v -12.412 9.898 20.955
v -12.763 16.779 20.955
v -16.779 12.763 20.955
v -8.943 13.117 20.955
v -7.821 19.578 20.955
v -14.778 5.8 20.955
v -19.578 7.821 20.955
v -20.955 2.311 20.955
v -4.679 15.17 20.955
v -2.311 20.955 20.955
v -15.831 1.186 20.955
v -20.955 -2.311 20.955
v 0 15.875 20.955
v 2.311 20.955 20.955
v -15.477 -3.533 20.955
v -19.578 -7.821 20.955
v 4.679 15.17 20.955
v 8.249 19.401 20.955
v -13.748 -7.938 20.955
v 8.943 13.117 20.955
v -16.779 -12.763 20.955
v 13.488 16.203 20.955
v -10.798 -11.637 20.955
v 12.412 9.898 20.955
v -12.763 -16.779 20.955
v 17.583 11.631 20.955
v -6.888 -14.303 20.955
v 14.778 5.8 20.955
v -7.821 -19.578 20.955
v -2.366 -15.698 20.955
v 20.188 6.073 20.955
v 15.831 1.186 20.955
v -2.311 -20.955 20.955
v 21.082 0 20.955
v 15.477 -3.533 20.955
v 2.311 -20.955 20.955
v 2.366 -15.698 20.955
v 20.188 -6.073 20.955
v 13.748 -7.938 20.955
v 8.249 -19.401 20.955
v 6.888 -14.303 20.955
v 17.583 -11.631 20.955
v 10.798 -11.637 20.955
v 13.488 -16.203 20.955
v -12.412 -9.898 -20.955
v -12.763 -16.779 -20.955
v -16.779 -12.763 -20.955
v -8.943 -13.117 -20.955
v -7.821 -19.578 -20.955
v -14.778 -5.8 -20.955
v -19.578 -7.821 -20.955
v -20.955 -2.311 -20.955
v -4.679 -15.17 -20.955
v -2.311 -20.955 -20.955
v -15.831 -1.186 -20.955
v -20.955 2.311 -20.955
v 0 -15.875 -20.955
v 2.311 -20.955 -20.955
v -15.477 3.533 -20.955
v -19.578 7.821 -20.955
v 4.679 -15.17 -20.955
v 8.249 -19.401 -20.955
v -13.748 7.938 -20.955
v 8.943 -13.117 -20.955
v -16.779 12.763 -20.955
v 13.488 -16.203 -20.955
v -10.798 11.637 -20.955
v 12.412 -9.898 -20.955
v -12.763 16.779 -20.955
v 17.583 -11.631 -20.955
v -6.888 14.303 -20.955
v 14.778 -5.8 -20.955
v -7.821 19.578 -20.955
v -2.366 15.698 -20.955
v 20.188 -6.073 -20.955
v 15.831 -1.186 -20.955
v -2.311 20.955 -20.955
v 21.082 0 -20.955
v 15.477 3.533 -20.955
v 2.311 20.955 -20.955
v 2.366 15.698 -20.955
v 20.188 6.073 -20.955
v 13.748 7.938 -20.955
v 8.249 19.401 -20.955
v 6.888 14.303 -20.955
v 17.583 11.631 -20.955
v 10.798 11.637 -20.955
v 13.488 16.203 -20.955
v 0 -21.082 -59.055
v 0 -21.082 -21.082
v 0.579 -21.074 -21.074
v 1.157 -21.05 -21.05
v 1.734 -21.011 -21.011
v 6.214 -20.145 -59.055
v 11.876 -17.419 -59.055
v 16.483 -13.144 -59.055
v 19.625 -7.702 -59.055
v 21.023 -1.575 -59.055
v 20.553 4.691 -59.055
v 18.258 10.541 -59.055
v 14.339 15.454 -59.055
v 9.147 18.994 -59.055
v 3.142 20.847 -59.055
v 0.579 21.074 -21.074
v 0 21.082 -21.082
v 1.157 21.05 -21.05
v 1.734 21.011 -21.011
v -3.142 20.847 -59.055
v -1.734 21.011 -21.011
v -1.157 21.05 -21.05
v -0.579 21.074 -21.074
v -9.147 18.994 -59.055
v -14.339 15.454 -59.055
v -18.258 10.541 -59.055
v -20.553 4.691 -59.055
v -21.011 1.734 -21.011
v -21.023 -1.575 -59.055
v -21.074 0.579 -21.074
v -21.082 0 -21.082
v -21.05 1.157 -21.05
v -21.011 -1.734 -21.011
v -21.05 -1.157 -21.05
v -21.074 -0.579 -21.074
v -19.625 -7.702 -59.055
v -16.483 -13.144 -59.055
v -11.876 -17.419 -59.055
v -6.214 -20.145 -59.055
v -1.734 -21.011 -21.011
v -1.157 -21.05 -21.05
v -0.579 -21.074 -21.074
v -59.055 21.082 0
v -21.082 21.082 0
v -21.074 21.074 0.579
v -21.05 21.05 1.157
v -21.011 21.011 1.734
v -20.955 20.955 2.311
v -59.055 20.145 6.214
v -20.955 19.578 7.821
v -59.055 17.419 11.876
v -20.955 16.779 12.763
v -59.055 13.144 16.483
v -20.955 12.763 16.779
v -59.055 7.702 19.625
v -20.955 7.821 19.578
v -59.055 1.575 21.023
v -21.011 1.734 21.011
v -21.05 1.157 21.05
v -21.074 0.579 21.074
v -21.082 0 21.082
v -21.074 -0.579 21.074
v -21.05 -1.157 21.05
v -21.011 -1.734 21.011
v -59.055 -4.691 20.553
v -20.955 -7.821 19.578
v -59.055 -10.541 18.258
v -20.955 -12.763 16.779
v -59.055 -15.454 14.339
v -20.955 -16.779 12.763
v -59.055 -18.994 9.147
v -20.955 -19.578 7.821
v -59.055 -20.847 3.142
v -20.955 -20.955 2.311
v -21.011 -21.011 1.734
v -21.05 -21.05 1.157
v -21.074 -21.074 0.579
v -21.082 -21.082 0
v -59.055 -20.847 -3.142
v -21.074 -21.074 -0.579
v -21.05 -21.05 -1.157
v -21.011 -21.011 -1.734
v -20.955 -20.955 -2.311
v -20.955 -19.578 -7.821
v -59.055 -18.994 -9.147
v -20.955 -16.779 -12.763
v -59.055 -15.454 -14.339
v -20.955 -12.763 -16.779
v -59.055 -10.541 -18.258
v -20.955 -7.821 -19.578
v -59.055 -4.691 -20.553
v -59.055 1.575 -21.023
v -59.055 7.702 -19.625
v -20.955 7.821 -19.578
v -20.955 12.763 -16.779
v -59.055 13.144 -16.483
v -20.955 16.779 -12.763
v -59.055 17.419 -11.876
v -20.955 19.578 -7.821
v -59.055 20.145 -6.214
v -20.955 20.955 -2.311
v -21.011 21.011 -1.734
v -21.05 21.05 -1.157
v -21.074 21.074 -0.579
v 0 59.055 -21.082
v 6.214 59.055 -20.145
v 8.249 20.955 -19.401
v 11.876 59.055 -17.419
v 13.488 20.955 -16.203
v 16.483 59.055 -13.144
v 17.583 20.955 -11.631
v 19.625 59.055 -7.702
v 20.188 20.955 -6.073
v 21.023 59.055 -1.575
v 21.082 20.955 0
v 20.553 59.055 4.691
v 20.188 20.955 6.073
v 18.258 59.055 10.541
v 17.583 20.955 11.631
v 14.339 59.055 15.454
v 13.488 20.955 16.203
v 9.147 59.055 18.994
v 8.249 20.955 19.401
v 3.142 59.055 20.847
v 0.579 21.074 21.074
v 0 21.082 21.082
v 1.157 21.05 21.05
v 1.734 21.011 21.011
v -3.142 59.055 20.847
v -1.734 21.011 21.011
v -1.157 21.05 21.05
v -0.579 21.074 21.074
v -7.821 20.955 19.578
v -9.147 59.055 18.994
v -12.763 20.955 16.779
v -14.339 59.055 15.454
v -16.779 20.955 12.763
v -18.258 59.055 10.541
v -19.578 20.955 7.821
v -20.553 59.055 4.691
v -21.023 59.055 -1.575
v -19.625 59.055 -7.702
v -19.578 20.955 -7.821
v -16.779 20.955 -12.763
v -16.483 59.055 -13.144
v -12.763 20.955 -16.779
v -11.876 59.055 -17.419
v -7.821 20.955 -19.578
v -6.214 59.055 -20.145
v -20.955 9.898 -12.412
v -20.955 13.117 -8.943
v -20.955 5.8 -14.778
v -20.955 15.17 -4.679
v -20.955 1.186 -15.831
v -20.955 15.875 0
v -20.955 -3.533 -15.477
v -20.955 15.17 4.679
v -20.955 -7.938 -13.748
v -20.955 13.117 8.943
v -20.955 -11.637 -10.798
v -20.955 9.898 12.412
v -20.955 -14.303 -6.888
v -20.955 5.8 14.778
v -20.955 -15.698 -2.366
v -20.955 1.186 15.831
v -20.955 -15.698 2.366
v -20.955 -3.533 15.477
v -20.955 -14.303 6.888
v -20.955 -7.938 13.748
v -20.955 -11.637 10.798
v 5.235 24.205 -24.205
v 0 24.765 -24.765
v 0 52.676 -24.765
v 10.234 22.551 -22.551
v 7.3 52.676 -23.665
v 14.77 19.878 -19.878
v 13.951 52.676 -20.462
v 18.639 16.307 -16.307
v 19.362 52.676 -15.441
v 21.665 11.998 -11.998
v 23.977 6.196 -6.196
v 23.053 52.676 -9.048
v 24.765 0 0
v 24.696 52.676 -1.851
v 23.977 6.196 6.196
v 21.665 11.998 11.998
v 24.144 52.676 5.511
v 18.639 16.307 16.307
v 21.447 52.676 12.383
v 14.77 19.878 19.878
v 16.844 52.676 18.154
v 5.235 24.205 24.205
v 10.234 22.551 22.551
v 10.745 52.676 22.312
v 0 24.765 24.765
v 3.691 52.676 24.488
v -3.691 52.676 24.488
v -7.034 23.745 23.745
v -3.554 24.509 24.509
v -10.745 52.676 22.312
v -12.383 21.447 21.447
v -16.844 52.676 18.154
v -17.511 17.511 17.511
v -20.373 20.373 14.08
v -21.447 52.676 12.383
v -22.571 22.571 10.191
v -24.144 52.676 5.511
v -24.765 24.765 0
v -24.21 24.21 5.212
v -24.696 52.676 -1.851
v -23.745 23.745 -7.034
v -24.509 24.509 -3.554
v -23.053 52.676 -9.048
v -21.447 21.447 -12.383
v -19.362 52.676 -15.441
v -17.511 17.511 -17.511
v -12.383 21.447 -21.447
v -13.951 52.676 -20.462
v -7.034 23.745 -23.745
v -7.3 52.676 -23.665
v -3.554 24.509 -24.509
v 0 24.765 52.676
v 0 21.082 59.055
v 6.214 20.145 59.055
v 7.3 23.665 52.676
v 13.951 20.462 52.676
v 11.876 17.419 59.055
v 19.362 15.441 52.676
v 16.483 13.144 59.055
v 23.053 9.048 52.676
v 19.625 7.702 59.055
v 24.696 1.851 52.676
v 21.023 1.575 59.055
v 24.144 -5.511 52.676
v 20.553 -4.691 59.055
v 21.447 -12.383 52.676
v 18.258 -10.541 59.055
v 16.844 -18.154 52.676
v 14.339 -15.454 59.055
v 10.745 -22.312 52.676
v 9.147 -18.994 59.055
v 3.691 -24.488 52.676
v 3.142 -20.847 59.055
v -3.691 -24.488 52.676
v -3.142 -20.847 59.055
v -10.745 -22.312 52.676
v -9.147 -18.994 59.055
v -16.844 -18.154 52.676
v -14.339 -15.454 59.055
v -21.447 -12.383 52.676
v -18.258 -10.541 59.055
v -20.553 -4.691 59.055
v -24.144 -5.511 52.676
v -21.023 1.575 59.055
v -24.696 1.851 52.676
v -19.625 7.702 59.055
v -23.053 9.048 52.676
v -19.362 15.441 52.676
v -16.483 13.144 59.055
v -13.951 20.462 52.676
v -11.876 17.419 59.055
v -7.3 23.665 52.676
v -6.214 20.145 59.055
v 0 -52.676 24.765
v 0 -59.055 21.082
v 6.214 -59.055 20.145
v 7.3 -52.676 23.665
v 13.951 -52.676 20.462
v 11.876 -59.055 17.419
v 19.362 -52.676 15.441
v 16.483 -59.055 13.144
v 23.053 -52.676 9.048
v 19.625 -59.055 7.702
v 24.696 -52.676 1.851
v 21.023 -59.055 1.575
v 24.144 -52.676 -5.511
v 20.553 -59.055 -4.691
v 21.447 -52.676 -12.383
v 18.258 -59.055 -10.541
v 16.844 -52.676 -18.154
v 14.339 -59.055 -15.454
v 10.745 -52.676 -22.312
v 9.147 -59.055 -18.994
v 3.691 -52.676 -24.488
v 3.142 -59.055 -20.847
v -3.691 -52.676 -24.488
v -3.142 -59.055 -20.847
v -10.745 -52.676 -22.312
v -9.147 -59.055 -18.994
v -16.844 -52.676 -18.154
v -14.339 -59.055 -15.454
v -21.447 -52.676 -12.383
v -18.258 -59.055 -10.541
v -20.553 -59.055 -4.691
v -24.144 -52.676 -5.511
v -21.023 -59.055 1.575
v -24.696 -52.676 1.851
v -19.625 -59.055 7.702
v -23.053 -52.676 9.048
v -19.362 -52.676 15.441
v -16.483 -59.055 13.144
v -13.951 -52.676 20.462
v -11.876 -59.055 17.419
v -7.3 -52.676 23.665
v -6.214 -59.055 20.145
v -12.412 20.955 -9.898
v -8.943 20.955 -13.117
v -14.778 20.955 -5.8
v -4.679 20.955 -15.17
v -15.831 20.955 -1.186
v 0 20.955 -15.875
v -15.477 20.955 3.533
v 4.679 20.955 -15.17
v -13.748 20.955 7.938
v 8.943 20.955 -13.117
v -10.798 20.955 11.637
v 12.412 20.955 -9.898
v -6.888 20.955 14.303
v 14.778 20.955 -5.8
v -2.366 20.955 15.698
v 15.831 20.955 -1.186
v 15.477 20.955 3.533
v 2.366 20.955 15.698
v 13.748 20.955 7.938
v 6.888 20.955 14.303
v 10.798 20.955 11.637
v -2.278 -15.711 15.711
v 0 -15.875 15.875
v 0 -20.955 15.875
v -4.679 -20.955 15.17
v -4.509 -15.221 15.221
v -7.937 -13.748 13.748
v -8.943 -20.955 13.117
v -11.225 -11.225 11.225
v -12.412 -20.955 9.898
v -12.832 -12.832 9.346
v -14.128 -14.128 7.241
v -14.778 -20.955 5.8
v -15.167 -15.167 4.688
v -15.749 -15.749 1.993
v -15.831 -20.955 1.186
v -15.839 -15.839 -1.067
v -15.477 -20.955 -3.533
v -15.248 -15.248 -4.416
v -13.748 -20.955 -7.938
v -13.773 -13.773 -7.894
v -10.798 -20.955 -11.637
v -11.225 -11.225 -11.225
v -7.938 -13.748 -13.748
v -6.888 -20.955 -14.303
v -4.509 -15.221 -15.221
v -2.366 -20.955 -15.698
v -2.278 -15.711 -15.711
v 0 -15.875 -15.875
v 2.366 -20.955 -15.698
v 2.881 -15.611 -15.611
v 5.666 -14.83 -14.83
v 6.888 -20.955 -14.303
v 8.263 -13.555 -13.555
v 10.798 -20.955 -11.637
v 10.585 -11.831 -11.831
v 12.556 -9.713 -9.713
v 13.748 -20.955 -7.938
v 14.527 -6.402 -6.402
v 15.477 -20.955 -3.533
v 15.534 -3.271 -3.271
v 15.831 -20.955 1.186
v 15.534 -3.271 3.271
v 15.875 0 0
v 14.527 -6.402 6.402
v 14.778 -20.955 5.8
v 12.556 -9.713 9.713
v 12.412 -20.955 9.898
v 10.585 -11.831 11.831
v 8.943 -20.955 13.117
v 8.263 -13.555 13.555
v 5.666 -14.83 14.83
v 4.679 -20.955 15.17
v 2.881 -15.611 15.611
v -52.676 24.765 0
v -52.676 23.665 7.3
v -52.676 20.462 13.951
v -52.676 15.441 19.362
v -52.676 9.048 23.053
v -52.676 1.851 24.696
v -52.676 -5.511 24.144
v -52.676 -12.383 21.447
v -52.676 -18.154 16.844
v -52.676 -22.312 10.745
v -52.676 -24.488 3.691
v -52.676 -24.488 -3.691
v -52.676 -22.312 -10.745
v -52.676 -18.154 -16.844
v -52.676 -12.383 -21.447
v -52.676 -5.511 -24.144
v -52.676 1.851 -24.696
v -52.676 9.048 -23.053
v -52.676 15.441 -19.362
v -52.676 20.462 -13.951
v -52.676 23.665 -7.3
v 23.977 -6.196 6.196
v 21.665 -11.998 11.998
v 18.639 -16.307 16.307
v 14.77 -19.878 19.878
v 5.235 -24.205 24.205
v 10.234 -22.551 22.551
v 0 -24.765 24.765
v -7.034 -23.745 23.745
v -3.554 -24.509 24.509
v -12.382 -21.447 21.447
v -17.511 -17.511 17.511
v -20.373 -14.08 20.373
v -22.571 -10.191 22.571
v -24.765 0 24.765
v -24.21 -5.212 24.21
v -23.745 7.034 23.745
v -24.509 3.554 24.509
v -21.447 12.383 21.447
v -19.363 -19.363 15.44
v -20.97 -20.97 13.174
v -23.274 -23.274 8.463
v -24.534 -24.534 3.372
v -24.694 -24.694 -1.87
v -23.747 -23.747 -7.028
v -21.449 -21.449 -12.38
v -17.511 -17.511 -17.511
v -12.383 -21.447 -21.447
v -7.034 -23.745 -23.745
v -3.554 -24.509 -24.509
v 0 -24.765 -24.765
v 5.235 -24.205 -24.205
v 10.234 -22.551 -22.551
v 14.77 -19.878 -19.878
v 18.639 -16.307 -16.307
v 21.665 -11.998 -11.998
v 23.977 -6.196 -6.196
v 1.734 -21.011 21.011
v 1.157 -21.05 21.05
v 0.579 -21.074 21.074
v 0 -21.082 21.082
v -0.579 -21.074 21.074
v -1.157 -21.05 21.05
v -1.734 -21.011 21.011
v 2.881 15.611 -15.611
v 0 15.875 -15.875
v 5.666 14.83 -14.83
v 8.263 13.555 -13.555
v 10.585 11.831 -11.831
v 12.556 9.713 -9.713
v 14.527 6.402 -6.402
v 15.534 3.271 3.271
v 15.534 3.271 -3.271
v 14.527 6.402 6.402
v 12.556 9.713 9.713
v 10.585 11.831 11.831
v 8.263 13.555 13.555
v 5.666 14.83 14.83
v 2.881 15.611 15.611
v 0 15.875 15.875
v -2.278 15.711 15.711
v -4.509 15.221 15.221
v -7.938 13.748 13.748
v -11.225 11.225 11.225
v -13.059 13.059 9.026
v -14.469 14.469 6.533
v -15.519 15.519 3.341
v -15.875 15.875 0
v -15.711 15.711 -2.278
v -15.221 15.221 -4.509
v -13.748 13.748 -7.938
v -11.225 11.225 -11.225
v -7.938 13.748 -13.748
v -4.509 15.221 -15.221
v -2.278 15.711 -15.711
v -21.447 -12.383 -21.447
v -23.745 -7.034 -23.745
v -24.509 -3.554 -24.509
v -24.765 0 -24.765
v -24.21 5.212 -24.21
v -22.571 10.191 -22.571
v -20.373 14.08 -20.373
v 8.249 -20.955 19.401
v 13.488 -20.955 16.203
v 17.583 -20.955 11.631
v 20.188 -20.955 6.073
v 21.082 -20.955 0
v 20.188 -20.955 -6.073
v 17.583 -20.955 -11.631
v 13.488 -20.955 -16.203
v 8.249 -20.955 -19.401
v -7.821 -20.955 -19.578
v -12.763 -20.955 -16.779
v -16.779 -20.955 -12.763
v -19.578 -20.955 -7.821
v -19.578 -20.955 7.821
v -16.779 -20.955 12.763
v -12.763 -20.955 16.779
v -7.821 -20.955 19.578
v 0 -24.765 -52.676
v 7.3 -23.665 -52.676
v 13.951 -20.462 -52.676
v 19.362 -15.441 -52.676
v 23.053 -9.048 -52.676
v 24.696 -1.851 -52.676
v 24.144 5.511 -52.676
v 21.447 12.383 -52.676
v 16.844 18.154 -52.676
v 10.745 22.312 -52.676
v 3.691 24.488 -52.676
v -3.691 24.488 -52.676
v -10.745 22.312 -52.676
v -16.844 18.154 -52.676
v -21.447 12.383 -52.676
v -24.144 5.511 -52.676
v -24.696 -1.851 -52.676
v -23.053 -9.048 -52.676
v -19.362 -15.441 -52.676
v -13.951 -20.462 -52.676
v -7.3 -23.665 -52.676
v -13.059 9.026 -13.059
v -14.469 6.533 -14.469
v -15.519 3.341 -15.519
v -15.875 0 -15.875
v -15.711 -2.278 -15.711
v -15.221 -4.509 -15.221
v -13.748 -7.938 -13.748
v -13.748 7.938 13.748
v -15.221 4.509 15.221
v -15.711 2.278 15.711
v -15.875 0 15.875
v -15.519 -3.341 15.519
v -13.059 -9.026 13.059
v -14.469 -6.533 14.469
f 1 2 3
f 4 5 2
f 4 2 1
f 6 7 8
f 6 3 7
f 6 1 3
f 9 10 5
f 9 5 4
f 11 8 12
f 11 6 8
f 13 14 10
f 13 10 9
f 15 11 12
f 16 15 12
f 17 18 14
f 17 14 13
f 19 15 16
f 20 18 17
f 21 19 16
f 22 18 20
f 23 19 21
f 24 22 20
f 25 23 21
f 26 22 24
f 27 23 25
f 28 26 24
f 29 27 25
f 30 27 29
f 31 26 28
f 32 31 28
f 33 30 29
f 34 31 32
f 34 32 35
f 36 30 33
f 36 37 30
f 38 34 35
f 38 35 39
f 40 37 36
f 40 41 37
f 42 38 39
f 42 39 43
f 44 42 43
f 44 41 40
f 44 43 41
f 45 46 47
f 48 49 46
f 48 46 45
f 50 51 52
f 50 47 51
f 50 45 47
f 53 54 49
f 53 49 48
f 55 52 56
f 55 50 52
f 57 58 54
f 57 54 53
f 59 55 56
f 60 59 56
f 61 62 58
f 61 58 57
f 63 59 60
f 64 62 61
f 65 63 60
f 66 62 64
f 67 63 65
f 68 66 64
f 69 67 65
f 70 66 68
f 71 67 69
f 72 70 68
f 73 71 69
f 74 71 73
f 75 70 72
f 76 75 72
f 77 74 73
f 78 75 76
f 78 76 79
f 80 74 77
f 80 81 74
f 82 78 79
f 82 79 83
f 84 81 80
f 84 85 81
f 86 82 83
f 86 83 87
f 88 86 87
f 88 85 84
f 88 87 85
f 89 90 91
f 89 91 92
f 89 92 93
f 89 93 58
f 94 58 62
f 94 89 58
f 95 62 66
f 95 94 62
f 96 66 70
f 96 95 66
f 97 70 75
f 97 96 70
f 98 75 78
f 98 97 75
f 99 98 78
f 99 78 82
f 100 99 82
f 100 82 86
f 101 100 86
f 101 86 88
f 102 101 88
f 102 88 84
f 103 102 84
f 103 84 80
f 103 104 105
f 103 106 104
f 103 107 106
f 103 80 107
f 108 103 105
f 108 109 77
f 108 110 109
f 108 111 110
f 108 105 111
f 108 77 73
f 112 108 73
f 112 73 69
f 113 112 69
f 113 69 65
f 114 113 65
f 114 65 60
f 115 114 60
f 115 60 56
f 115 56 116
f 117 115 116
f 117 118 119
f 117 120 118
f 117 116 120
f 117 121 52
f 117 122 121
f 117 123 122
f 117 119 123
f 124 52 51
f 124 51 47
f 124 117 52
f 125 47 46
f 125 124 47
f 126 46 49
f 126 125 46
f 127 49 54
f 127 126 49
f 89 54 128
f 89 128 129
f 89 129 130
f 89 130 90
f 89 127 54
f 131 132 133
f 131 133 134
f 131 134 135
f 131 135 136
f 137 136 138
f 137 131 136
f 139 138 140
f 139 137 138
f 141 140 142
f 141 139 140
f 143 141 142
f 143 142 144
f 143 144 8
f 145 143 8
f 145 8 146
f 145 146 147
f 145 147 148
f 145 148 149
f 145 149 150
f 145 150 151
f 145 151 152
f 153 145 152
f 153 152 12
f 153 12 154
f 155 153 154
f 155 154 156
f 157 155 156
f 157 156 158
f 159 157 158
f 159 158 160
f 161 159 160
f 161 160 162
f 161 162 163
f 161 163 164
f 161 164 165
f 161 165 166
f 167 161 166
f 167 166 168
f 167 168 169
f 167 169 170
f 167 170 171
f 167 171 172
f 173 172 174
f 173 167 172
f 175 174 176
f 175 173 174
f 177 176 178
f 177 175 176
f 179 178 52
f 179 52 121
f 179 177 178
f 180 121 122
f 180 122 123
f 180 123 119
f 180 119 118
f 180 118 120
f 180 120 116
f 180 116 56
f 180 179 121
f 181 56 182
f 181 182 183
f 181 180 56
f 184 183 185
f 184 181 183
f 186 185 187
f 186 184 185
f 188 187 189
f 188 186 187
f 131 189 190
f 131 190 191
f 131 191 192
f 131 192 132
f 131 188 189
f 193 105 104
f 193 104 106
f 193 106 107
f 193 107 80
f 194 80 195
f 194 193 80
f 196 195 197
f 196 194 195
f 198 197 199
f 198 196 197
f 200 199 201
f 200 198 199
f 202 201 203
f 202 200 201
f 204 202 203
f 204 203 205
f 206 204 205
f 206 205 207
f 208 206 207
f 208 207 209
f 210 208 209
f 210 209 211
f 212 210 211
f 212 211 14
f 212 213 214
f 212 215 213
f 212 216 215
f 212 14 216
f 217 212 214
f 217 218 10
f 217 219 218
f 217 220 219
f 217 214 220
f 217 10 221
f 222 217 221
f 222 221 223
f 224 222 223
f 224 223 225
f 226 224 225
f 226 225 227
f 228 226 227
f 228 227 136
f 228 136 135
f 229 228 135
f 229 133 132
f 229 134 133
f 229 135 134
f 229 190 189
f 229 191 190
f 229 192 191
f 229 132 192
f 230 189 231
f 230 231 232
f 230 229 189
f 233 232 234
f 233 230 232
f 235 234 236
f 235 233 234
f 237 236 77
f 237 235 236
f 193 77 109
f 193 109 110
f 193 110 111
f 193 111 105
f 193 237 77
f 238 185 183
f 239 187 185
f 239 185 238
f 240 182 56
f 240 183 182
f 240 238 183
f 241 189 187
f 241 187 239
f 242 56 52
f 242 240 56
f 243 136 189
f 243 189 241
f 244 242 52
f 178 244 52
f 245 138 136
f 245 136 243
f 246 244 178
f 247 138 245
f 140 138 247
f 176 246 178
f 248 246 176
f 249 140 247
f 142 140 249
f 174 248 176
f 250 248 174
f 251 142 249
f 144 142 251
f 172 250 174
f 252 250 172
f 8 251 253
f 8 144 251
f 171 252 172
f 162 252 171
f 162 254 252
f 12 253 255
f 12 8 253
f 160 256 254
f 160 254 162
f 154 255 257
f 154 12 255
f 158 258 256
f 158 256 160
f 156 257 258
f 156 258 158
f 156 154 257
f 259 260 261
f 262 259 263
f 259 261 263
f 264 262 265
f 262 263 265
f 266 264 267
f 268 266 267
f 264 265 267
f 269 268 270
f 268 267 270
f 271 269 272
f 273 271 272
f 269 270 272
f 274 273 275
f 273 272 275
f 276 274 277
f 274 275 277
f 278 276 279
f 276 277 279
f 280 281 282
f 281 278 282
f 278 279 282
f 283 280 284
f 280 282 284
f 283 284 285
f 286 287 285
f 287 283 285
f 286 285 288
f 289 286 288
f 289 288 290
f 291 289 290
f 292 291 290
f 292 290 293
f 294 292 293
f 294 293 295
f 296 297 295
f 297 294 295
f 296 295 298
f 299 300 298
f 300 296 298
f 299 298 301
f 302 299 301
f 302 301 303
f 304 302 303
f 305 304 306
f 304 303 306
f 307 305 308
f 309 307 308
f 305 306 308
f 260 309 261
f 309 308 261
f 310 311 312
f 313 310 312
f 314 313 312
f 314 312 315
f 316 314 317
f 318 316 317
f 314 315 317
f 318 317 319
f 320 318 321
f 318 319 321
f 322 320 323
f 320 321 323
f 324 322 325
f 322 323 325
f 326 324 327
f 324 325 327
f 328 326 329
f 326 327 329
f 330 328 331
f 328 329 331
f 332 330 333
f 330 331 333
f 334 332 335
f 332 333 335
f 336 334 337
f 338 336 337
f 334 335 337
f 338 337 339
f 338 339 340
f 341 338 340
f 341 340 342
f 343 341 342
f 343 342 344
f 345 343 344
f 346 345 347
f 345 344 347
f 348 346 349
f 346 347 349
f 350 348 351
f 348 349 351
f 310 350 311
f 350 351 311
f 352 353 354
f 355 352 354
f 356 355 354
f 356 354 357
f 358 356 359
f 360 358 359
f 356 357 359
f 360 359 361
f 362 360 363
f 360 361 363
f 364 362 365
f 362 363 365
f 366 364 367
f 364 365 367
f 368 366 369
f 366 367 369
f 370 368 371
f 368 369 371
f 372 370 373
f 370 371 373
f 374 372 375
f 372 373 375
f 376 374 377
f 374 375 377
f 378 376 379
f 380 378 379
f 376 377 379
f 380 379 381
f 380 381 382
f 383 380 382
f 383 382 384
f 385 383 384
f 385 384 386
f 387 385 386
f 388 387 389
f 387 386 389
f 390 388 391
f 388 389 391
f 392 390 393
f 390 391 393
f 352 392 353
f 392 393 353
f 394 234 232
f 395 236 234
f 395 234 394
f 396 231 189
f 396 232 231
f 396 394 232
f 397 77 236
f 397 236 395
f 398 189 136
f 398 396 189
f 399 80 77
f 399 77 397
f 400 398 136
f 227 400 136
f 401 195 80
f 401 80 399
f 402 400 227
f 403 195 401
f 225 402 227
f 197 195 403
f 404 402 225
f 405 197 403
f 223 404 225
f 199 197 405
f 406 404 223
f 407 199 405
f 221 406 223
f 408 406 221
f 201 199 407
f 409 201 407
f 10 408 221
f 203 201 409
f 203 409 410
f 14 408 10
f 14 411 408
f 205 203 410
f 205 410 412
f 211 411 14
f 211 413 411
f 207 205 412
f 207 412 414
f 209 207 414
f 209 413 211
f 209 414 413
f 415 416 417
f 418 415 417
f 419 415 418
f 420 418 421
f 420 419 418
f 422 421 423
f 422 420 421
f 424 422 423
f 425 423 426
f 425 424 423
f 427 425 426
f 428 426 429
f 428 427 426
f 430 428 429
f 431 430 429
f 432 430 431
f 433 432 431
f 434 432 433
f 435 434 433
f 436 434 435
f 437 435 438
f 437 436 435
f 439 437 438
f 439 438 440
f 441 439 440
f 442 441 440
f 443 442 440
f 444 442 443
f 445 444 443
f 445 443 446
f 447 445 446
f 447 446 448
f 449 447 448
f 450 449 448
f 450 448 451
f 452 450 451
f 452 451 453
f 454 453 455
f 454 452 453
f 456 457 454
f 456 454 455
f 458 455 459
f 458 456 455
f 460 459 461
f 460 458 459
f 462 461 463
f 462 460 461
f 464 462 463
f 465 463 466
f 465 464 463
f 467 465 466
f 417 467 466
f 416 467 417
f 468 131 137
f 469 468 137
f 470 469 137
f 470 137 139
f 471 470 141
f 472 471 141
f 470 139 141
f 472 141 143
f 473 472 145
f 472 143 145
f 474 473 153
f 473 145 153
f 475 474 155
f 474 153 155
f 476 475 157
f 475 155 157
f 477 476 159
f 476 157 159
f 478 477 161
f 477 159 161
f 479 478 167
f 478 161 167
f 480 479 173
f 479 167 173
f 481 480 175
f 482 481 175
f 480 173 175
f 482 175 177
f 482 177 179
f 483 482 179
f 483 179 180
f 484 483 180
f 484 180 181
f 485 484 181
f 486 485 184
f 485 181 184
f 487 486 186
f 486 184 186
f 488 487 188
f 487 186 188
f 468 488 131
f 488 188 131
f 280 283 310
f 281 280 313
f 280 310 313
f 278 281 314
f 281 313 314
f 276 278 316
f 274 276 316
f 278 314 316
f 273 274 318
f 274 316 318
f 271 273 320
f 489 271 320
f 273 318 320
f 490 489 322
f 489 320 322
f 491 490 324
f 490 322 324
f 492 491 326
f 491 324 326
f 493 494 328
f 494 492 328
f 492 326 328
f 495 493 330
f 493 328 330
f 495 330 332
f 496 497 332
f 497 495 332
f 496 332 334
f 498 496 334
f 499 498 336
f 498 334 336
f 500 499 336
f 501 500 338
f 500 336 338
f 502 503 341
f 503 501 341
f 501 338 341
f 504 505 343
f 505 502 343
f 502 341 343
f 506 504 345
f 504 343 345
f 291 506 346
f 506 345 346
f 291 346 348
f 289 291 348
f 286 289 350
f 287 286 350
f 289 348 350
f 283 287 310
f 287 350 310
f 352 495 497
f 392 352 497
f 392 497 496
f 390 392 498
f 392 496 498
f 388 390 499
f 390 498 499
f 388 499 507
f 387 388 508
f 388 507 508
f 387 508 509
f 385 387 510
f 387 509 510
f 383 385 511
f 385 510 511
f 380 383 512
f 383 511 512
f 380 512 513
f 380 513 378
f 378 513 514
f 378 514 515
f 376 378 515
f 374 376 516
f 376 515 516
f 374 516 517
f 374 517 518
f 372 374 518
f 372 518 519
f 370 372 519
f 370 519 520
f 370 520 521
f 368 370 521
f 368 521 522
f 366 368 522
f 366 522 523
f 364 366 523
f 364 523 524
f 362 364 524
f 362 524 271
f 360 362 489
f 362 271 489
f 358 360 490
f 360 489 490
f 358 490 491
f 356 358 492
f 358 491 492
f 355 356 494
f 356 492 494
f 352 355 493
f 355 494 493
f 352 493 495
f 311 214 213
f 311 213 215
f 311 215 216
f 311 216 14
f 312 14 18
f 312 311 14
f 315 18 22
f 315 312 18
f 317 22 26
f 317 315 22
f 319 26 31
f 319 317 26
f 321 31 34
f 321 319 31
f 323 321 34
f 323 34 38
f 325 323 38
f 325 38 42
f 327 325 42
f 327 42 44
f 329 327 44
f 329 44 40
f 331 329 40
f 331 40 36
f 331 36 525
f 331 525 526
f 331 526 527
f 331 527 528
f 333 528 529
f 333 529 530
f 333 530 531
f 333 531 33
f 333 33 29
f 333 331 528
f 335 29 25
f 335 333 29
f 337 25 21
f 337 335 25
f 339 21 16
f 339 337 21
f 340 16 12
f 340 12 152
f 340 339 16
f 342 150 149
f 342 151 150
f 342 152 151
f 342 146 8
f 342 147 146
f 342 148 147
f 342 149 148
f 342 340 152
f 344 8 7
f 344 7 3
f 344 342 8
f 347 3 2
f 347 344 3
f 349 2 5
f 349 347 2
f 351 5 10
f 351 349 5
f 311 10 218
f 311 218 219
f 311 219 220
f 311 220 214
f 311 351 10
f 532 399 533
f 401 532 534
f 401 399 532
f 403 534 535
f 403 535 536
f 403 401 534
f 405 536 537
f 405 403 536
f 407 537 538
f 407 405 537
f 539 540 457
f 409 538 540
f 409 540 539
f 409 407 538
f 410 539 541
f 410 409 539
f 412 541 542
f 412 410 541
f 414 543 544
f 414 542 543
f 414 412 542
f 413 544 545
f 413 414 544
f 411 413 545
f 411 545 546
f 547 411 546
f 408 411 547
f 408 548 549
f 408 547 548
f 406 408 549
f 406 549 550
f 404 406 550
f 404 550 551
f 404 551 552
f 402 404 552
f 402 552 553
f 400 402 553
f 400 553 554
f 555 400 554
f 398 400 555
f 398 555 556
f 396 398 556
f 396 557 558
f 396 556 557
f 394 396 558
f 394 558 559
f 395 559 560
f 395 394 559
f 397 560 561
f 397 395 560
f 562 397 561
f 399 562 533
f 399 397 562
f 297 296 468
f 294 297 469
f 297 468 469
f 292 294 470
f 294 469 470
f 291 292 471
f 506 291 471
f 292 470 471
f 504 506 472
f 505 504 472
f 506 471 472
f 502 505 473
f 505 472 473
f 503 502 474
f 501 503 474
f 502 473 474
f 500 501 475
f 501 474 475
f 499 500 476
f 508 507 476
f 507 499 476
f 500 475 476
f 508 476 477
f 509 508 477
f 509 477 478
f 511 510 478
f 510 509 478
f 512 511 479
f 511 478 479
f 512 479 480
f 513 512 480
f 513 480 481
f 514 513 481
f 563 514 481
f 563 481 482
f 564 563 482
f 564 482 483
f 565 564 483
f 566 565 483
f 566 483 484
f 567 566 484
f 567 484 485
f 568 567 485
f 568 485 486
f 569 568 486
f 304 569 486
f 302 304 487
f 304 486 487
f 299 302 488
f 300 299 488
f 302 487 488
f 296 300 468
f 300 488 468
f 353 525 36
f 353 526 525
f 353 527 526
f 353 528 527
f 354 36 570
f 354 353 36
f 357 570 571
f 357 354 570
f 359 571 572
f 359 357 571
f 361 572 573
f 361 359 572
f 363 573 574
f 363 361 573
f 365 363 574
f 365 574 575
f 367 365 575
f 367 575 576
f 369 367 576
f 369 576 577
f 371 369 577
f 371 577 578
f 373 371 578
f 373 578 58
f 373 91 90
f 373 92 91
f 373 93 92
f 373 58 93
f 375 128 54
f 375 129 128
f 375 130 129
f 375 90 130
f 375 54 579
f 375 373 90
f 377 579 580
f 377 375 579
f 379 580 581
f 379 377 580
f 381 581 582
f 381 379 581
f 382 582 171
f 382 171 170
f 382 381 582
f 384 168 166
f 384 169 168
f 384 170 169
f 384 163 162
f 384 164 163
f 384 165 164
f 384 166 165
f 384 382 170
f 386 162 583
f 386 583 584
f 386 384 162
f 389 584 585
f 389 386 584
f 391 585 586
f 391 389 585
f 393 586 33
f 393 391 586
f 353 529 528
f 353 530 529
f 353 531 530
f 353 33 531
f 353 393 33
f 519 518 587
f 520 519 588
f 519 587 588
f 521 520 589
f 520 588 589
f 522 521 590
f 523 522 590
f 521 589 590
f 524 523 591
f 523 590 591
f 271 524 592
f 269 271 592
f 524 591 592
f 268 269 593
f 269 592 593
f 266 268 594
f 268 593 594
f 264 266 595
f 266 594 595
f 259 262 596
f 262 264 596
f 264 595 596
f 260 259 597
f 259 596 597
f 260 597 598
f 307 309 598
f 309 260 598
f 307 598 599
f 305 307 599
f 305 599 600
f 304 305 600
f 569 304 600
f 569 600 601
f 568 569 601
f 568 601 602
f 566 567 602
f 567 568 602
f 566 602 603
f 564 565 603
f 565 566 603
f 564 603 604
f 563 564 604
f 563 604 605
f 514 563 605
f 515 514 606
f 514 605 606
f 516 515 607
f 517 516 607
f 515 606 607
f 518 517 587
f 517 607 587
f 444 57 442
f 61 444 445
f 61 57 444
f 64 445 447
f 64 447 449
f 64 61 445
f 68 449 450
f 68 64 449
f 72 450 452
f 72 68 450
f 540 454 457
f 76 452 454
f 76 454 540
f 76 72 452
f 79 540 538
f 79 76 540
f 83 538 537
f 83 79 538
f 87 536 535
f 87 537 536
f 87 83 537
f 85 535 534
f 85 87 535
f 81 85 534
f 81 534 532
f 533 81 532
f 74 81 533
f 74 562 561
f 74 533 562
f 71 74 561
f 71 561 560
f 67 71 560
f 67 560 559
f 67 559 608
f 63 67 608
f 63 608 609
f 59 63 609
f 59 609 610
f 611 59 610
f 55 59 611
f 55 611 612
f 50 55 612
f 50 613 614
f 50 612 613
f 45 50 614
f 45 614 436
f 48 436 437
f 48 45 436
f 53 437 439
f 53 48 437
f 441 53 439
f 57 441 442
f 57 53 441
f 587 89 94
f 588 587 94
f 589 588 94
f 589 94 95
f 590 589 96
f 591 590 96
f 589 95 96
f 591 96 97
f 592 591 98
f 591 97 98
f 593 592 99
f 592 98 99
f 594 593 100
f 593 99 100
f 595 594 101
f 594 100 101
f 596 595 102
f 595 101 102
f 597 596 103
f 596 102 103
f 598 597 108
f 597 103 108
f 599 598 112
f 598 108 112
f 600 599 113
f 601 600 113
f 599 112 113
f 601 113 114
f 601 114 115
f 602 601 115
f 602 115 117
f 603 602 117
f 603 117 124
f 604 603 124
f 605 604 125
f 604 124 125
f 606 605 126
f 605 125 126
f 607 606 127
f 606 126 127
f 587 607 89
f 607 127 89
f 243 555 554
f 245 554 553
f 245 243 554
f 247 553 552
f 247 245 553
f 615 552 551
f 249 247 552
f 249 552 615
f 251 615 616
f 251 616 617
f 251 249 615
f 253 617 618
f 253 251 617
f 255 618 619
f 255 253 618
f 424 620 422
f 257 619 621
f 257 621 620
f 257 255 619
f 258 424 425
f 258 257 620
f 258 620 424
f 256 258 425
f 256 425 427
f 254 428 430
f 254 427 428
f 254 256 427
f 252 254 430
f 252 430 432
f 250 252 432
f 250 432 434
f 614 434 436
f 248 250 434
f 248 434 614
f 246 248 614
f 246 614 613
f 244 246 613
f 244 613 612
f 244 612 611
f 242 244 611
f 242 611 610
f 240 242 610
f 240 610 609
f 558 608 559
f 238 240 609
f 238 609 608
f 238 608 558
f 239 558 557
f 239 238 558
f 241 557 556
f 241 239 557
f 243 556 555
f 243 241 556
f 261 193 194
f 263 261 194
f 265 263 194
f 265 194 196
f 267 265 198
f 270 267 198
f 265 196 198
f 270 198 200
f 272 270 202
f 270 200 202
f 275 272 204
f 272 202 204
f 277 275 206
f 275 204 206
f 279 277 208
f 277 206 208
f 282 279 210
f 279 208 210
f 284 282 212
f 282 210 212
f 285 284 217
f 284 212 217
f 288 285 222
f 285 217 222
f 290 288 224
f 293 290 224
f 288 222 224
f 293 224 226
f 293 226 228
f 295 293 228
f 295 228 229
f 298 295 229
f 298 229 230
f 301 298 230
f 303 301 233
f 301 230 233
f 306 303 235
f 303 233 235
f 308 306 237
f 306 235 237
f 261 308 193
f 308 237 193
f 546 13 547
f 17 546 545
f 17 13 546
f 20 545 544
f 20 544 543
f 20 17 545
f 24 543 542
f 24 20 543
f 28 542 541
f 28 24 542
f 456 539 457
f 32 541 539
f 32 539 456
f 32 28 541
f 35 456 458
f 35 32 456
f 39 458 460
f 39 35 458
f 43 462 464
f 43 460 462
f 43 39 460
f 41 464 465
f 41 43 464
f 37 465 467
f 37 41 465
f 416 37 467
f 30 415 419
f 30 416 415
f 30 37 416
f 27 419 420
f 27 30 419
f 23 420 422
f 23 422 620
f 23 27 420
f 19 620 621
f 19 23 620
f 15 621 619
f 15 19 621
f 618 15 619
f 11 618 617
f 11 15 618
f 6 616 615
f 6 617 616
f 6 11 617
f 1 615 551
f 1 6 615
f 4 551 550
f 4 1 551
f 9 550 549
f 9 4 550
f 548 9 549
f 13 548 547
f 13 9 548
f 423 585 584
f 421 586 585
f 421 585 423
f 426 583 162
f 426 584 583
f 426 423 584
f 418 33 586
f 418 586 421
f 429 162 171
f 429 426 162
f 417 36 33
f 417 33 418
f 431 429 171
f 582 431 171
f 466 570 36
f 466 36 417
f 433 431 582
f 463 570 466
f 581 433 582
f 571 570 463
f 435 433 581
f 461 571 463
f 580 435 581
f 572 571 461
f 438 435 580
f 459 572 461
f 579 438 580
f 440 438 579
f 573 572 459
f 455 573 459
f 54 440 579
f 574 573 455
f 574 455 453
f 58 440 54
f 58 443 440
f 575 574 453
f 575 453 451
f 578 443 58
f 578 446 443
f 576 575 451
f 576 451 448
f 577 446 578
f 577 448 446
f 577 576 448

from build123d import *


with BuildPart() as f5:
    # F0 (on Right) → F5 (revolve)
    with BuildSketch(Plane.YZ):
        with BuildLine():
            Line((-52.6758568757, 24.765), (-59.055, 21.082))
            Line((-59.055, 21.082), (-20.955, 21.082))
            Line((-20.955, 21.082), (-20.955, 15.875))
            Line((-20.955, 15.875), (0, 15.875))
            ThreePointArc((0, 15.875), (11.2253201513, 11.2253201513), (15.875, 0))
            Line((15.875, 0), (24.765, 0))
            ThreePointArc((24.765, 0), (17.5114994361, 17.5114994361), (0, 24.765))
            Line((0, 24.765), (-52.6758568757, 24.765))
        make_face()
        with BuildLine():
            Line((-20.955, 21.082), (-59.055, 21.082))
            Line((-59.055, 21.082), (-59.055, 0))
            Line((-59.055, 0), (0, 0))
            Line((0, 0), (10.5189766587, 0))
            Line((10.5189766587, 0), (15.875, 0))
            ThreePointArc((15.875, 0), (11.2253201513, 11.2253201513), (0, 15.875))
            Line((0, 15.875), (-20.955, 15.875))
            Line((-20.955, 15.875), (-20.955, 21.082))
        make_face()
    revolve(axis=Axis((0, -21.59, 0), (0, 1, 0)))

    # F1 (on Right) → F6 (revolve)
    with BuildSketch(Plane.YZ):
        with BuildLine():
            Line((-24.765, -52.6758568757), (-21.082, -59.055))
            Line((-21.082, -59.055), (-21.082, -20.955))
            Line((-21.082, -20.955), (-15.875, -20.955))
            Line((-15.875, -20.955), (-15.875, 0))
            ThreePointArc((-15.875, 0), (-11.2253201513, 11.2253201513), (0, 15.875))
            Line((0, 15.875), (0, 24.765))
            ThreePointArc((0, 24.765), (-17.5114994361, 17.5114994361), (-24.765, 0))
            Line((-24.765, 0), (-24.765, -52.6758568757))
        make_face()
        with BuildLine():
            Line((-21.082, -20.955), (-21.082, -59.055))
            Line((-21.082, -59.055), (0, -59.055))
            Line((0, -59.055), (0, 0))
            Line((0, 0), (0, 15.875))
            ThreePointArc((0, 15.875), (-11.2253201513, 11.2253201513), (-15.875, 0))
            Line((-15.875, 0), (-15.875, -20.955))
            Line((-15.875, -20.955), (-21.082, -20.955))
        make_face()
    revolve(axis=Axis((0, 0, -21.59), (0, 0, 1)))

    # F2 (on Right) → F7 (revolve)
    with BuildSketch(Plane.YZ):
        with BuildLine():
            Line((52.6758568757, -24.765), (59.055, -21.082))
            Line((59.055, -21.082), (20.955, -21.082))
            Line((20.955, -21.082), (20.955, -15.875))
            Line((20.955, -15.875), (0, -15.875))
            ThreePointArc((0, -15.875), (-11.2253201513, -11.2253201513), (-15.875, 0))
            Line((-15.875, 0), (-24.765, 0))
            ThreePointArc((-24.765, 0), (-17.5114994361, -17.5114994361), (0, -24.765))
            Line((0, -24.765), (52.6758568757, -24.765))
        make_face()
        with BuildLine():
            Line((20.955, -21.082), (59.055, -21.082))
            Line((59.055, -21.082), (59.055, 0))
            Line((59.055, 0), (10.5189766587, 0))
            Line((10.5189766587, 0), (0, 0))
            Line((0, 0), (-15.875, 0))
            ThreePointArc((-15.875, 0), (-11.2253201513, -11.2253201513), (0, -15.875))
            Line((0, -15.875), (20.955, -15.875))
            Line((20.955, -15.875), (20.955, -21.082))
        make_face()
    revolve(axis=Axis((0, 21.59, 0), (0, -1, 0)))

    # F3 (on Right) → F8 (revolve)
    with BuildSketch(Plane.YZ):
        with BuildLine():
            Line((24.765, 52.6758568757), (21.082, 59.055))
            Line((21.082, 59.055), (21.082, 20.955))
            Line((21.082, 20.955), (15.875, 20.955))
            Line((15.875, 20.955), (15.875, 0))
            ThreePointArc((15.875, 0), (11.2253201513, -11.2253201513), (0, -15.875))
            Line((0, -15.875), (0, -24.765))
            ThreePointArc((0, -24.765), (17.5114994361, -17.5114994361), (24.765, 0))
            Line((24.765, 0), (24.765, 52.6758568757))
        make_face()
        with BuildLine():
            Line((21.082, 20.955), (21.082, 59.055))
            Line((21.082, 59.055), (0, 59.055))
            Line((0, 59.055), (0, 9.2996467855))
            Line((0, 9.2996467855), (0, 0))
            Line((0, 0), (0, -15.875))
            ThreePointArc((0, -15.875), (11.2253201513, -11.2253201513), (15.875, 0))
            Line((15.875, 0), (15.875, 20.955))
            Line((15.875, 20.955), (21.082, 20.955))
        make_face()
    revolve(axis=Axis((0, 0, 21.59), (0, 0, -1)))

    # F4 (on Top) → F9 (revolve)
    with BuildSketch(Plane.XY):
        with BuildLine():
            Line((-52.6758568757, 24.765), (-59.055, 21.082))
            Line((-59.055, 21.082), (-20.955, 21.082))
            Line((-20.955, 21.082), (-20.955, 15.875))
            Line((-20.955, 15.875), (0, 15.875))
            ThreePointArc((0, 15.875), (11.2253201513, 11.2253201513), (15.875, 0))
            Line((15.875, 0), (24.765, 0))
            ThreePointArc((24.765, 0), (17.5114994361, 17.5114994361), (0, 24.765))
            Line((0, 24.765), (-52.6758568757, 24.765))
        make_face()
        with BuildLine():
            Line((-20.955, 21.082), (-59.055, 21.082))
            Line((-59.055, 21.082), (-59.055, 0))
            Line((-59.055, 0), (-12.5608257832, 0))
            Line((-12.5608257832, 0), (0, 0))
            Line((0, 0), (15.875, 0))
            ThreePointArc((15.875, 0), (11.2253201513, 11.2253201513), (0, 15.875))
            Line((0, 15.875), (-20.955, 15.875))
            Line((-20.955, 15.875), (-20.955, 21.082))
        make_face()
    revolve(axis=Axis((-21.59, 0, 0), (1, 0, 0)))

    # F0 (on Right) → F10 (revolve, cut)
    with BuildSketch(Plane.YZ):
        with BuildLine():
            Line((-20.955, 21.082), (-59.055, 21.082))
            Line((-59.055, 21.082), (-59.055, 0))
            Line((-59.055, 0), (0, 0))
            Line((0, 0), (10.5189766587, 0))
            Line((10.5189766587, 0), (15.875, 0))
            ThreePointArc((15.875, 0), (11.2253201513, 11.2253201513), (0, 15.875))
            Line((0, 15.875), (-20.955, 15.875))
            Line((-20.955, 15.875), (-20.955, 21.082))
        make_face()
    revolve(axis=Axis((0, -21.59, 0), (0, 1, 0)), mode=Mode.SUBTRACT)

    # F1 (on Right) → F11 (revolve, cut)
    with BuildSketch(Plane.YZ):
        with BuildLine():
            Line((-21.082, -20.955), (-21.082, -59.055))
            Line((-21.082, -59.055), (0, -59.055))
            Line((0, -59.055), (0, 0))
            Line((0, 0), (0, 15.875))
            ThreePointArc((0, 15.875), (-11.2253201513, 11.2253201513), (-15.875, 0))
            Line((-15.875, 0), (-15.875, -20.955))
            Line((-15.875, -20.955), (-21.082, -20.955))
        make_face()
    revolve(axis=Axis((0, 0, -21.59), (0, 0, 1)), mode=Mode.SUBTRACT)

    # F2 (on Right) → F12 (revolve, cut)
    with BuildSketch(Plane.YZ):
        with BuildLine():
            Line((20.955, -21.082), (59.055, -21.082))
            Line((59.055, -21.082), (59.055, 0))
            Line((59.055, 0), (10.5189766587, 0))
            Line((10.5189766587, 0), (0, 0))
            Line((0, 0), (-15.875, 0))
            ThreePointArc((-15.875, 0), (-11.2253201513, -11.2253201513), (0, -15.875))
            Line((0, -15.875), (20.955, -15.875))
            Line((20.955, -15.875), (20.955, -21.082))
        make_face()
    revolve(axis=Axis((0, 21.59, 0), (0, -1, 0)), mode=Mode.SUBTRACT)

    # F3 (on Right) → F13 (revolve, cut)
    with BuildSketch(Plane.YZ):
        with BuildLine():
            Line((21.082, 20.955), (21.082, 59.055))
            Line((21.082, 59.055), (0, 59.055))
            Line((0, 59.055), (0, 9.2996467855))
            Line((0, 9.2996467855), (0, 0))
            Line((0, 0), (0, -15.875))
            ThreePointArc((0, -15.875), (11.2253201513, -11.2253201513), (15.875, 0))
            Line((15.875, 0), (15.875, 20.955))
            Line((15.875, 20.955), (21.082, 20.955))
        make_face()
    revolve(axis=Axis((0, 0, 21.59), (0, 0, -1)), mode=Mode.SUBTRACT)

    # F4 (on Top) → F14 (revolve, cut)
    with BuildSketch(Plane.XY):
        with BuildLine():
            Line((-20.955, 21.082), (-59.055, 21.082))
            Line((-59.055, 21.082), (-59.055, 0))
            Line((-59.055, 0), (-12.5608257832, 0))
            Line((-12.5608257832, 0), (0, 0))
            Line((0, 0), (15.875, 0))
            ThreePointArc((15.875, 0), (11.2253201513, 11.2253201513), (0, 15.875))
            Line((0, 15.875), (-20.955, 15.875))
            Line((-20.955, 15.875), (-20.955, 21.082))
        make_face()
    revolve(axis=Axis((-21.59, 0, 0), (1, 0, 0)), mode=Mode.SUBTRACT)


solid = f5.part
